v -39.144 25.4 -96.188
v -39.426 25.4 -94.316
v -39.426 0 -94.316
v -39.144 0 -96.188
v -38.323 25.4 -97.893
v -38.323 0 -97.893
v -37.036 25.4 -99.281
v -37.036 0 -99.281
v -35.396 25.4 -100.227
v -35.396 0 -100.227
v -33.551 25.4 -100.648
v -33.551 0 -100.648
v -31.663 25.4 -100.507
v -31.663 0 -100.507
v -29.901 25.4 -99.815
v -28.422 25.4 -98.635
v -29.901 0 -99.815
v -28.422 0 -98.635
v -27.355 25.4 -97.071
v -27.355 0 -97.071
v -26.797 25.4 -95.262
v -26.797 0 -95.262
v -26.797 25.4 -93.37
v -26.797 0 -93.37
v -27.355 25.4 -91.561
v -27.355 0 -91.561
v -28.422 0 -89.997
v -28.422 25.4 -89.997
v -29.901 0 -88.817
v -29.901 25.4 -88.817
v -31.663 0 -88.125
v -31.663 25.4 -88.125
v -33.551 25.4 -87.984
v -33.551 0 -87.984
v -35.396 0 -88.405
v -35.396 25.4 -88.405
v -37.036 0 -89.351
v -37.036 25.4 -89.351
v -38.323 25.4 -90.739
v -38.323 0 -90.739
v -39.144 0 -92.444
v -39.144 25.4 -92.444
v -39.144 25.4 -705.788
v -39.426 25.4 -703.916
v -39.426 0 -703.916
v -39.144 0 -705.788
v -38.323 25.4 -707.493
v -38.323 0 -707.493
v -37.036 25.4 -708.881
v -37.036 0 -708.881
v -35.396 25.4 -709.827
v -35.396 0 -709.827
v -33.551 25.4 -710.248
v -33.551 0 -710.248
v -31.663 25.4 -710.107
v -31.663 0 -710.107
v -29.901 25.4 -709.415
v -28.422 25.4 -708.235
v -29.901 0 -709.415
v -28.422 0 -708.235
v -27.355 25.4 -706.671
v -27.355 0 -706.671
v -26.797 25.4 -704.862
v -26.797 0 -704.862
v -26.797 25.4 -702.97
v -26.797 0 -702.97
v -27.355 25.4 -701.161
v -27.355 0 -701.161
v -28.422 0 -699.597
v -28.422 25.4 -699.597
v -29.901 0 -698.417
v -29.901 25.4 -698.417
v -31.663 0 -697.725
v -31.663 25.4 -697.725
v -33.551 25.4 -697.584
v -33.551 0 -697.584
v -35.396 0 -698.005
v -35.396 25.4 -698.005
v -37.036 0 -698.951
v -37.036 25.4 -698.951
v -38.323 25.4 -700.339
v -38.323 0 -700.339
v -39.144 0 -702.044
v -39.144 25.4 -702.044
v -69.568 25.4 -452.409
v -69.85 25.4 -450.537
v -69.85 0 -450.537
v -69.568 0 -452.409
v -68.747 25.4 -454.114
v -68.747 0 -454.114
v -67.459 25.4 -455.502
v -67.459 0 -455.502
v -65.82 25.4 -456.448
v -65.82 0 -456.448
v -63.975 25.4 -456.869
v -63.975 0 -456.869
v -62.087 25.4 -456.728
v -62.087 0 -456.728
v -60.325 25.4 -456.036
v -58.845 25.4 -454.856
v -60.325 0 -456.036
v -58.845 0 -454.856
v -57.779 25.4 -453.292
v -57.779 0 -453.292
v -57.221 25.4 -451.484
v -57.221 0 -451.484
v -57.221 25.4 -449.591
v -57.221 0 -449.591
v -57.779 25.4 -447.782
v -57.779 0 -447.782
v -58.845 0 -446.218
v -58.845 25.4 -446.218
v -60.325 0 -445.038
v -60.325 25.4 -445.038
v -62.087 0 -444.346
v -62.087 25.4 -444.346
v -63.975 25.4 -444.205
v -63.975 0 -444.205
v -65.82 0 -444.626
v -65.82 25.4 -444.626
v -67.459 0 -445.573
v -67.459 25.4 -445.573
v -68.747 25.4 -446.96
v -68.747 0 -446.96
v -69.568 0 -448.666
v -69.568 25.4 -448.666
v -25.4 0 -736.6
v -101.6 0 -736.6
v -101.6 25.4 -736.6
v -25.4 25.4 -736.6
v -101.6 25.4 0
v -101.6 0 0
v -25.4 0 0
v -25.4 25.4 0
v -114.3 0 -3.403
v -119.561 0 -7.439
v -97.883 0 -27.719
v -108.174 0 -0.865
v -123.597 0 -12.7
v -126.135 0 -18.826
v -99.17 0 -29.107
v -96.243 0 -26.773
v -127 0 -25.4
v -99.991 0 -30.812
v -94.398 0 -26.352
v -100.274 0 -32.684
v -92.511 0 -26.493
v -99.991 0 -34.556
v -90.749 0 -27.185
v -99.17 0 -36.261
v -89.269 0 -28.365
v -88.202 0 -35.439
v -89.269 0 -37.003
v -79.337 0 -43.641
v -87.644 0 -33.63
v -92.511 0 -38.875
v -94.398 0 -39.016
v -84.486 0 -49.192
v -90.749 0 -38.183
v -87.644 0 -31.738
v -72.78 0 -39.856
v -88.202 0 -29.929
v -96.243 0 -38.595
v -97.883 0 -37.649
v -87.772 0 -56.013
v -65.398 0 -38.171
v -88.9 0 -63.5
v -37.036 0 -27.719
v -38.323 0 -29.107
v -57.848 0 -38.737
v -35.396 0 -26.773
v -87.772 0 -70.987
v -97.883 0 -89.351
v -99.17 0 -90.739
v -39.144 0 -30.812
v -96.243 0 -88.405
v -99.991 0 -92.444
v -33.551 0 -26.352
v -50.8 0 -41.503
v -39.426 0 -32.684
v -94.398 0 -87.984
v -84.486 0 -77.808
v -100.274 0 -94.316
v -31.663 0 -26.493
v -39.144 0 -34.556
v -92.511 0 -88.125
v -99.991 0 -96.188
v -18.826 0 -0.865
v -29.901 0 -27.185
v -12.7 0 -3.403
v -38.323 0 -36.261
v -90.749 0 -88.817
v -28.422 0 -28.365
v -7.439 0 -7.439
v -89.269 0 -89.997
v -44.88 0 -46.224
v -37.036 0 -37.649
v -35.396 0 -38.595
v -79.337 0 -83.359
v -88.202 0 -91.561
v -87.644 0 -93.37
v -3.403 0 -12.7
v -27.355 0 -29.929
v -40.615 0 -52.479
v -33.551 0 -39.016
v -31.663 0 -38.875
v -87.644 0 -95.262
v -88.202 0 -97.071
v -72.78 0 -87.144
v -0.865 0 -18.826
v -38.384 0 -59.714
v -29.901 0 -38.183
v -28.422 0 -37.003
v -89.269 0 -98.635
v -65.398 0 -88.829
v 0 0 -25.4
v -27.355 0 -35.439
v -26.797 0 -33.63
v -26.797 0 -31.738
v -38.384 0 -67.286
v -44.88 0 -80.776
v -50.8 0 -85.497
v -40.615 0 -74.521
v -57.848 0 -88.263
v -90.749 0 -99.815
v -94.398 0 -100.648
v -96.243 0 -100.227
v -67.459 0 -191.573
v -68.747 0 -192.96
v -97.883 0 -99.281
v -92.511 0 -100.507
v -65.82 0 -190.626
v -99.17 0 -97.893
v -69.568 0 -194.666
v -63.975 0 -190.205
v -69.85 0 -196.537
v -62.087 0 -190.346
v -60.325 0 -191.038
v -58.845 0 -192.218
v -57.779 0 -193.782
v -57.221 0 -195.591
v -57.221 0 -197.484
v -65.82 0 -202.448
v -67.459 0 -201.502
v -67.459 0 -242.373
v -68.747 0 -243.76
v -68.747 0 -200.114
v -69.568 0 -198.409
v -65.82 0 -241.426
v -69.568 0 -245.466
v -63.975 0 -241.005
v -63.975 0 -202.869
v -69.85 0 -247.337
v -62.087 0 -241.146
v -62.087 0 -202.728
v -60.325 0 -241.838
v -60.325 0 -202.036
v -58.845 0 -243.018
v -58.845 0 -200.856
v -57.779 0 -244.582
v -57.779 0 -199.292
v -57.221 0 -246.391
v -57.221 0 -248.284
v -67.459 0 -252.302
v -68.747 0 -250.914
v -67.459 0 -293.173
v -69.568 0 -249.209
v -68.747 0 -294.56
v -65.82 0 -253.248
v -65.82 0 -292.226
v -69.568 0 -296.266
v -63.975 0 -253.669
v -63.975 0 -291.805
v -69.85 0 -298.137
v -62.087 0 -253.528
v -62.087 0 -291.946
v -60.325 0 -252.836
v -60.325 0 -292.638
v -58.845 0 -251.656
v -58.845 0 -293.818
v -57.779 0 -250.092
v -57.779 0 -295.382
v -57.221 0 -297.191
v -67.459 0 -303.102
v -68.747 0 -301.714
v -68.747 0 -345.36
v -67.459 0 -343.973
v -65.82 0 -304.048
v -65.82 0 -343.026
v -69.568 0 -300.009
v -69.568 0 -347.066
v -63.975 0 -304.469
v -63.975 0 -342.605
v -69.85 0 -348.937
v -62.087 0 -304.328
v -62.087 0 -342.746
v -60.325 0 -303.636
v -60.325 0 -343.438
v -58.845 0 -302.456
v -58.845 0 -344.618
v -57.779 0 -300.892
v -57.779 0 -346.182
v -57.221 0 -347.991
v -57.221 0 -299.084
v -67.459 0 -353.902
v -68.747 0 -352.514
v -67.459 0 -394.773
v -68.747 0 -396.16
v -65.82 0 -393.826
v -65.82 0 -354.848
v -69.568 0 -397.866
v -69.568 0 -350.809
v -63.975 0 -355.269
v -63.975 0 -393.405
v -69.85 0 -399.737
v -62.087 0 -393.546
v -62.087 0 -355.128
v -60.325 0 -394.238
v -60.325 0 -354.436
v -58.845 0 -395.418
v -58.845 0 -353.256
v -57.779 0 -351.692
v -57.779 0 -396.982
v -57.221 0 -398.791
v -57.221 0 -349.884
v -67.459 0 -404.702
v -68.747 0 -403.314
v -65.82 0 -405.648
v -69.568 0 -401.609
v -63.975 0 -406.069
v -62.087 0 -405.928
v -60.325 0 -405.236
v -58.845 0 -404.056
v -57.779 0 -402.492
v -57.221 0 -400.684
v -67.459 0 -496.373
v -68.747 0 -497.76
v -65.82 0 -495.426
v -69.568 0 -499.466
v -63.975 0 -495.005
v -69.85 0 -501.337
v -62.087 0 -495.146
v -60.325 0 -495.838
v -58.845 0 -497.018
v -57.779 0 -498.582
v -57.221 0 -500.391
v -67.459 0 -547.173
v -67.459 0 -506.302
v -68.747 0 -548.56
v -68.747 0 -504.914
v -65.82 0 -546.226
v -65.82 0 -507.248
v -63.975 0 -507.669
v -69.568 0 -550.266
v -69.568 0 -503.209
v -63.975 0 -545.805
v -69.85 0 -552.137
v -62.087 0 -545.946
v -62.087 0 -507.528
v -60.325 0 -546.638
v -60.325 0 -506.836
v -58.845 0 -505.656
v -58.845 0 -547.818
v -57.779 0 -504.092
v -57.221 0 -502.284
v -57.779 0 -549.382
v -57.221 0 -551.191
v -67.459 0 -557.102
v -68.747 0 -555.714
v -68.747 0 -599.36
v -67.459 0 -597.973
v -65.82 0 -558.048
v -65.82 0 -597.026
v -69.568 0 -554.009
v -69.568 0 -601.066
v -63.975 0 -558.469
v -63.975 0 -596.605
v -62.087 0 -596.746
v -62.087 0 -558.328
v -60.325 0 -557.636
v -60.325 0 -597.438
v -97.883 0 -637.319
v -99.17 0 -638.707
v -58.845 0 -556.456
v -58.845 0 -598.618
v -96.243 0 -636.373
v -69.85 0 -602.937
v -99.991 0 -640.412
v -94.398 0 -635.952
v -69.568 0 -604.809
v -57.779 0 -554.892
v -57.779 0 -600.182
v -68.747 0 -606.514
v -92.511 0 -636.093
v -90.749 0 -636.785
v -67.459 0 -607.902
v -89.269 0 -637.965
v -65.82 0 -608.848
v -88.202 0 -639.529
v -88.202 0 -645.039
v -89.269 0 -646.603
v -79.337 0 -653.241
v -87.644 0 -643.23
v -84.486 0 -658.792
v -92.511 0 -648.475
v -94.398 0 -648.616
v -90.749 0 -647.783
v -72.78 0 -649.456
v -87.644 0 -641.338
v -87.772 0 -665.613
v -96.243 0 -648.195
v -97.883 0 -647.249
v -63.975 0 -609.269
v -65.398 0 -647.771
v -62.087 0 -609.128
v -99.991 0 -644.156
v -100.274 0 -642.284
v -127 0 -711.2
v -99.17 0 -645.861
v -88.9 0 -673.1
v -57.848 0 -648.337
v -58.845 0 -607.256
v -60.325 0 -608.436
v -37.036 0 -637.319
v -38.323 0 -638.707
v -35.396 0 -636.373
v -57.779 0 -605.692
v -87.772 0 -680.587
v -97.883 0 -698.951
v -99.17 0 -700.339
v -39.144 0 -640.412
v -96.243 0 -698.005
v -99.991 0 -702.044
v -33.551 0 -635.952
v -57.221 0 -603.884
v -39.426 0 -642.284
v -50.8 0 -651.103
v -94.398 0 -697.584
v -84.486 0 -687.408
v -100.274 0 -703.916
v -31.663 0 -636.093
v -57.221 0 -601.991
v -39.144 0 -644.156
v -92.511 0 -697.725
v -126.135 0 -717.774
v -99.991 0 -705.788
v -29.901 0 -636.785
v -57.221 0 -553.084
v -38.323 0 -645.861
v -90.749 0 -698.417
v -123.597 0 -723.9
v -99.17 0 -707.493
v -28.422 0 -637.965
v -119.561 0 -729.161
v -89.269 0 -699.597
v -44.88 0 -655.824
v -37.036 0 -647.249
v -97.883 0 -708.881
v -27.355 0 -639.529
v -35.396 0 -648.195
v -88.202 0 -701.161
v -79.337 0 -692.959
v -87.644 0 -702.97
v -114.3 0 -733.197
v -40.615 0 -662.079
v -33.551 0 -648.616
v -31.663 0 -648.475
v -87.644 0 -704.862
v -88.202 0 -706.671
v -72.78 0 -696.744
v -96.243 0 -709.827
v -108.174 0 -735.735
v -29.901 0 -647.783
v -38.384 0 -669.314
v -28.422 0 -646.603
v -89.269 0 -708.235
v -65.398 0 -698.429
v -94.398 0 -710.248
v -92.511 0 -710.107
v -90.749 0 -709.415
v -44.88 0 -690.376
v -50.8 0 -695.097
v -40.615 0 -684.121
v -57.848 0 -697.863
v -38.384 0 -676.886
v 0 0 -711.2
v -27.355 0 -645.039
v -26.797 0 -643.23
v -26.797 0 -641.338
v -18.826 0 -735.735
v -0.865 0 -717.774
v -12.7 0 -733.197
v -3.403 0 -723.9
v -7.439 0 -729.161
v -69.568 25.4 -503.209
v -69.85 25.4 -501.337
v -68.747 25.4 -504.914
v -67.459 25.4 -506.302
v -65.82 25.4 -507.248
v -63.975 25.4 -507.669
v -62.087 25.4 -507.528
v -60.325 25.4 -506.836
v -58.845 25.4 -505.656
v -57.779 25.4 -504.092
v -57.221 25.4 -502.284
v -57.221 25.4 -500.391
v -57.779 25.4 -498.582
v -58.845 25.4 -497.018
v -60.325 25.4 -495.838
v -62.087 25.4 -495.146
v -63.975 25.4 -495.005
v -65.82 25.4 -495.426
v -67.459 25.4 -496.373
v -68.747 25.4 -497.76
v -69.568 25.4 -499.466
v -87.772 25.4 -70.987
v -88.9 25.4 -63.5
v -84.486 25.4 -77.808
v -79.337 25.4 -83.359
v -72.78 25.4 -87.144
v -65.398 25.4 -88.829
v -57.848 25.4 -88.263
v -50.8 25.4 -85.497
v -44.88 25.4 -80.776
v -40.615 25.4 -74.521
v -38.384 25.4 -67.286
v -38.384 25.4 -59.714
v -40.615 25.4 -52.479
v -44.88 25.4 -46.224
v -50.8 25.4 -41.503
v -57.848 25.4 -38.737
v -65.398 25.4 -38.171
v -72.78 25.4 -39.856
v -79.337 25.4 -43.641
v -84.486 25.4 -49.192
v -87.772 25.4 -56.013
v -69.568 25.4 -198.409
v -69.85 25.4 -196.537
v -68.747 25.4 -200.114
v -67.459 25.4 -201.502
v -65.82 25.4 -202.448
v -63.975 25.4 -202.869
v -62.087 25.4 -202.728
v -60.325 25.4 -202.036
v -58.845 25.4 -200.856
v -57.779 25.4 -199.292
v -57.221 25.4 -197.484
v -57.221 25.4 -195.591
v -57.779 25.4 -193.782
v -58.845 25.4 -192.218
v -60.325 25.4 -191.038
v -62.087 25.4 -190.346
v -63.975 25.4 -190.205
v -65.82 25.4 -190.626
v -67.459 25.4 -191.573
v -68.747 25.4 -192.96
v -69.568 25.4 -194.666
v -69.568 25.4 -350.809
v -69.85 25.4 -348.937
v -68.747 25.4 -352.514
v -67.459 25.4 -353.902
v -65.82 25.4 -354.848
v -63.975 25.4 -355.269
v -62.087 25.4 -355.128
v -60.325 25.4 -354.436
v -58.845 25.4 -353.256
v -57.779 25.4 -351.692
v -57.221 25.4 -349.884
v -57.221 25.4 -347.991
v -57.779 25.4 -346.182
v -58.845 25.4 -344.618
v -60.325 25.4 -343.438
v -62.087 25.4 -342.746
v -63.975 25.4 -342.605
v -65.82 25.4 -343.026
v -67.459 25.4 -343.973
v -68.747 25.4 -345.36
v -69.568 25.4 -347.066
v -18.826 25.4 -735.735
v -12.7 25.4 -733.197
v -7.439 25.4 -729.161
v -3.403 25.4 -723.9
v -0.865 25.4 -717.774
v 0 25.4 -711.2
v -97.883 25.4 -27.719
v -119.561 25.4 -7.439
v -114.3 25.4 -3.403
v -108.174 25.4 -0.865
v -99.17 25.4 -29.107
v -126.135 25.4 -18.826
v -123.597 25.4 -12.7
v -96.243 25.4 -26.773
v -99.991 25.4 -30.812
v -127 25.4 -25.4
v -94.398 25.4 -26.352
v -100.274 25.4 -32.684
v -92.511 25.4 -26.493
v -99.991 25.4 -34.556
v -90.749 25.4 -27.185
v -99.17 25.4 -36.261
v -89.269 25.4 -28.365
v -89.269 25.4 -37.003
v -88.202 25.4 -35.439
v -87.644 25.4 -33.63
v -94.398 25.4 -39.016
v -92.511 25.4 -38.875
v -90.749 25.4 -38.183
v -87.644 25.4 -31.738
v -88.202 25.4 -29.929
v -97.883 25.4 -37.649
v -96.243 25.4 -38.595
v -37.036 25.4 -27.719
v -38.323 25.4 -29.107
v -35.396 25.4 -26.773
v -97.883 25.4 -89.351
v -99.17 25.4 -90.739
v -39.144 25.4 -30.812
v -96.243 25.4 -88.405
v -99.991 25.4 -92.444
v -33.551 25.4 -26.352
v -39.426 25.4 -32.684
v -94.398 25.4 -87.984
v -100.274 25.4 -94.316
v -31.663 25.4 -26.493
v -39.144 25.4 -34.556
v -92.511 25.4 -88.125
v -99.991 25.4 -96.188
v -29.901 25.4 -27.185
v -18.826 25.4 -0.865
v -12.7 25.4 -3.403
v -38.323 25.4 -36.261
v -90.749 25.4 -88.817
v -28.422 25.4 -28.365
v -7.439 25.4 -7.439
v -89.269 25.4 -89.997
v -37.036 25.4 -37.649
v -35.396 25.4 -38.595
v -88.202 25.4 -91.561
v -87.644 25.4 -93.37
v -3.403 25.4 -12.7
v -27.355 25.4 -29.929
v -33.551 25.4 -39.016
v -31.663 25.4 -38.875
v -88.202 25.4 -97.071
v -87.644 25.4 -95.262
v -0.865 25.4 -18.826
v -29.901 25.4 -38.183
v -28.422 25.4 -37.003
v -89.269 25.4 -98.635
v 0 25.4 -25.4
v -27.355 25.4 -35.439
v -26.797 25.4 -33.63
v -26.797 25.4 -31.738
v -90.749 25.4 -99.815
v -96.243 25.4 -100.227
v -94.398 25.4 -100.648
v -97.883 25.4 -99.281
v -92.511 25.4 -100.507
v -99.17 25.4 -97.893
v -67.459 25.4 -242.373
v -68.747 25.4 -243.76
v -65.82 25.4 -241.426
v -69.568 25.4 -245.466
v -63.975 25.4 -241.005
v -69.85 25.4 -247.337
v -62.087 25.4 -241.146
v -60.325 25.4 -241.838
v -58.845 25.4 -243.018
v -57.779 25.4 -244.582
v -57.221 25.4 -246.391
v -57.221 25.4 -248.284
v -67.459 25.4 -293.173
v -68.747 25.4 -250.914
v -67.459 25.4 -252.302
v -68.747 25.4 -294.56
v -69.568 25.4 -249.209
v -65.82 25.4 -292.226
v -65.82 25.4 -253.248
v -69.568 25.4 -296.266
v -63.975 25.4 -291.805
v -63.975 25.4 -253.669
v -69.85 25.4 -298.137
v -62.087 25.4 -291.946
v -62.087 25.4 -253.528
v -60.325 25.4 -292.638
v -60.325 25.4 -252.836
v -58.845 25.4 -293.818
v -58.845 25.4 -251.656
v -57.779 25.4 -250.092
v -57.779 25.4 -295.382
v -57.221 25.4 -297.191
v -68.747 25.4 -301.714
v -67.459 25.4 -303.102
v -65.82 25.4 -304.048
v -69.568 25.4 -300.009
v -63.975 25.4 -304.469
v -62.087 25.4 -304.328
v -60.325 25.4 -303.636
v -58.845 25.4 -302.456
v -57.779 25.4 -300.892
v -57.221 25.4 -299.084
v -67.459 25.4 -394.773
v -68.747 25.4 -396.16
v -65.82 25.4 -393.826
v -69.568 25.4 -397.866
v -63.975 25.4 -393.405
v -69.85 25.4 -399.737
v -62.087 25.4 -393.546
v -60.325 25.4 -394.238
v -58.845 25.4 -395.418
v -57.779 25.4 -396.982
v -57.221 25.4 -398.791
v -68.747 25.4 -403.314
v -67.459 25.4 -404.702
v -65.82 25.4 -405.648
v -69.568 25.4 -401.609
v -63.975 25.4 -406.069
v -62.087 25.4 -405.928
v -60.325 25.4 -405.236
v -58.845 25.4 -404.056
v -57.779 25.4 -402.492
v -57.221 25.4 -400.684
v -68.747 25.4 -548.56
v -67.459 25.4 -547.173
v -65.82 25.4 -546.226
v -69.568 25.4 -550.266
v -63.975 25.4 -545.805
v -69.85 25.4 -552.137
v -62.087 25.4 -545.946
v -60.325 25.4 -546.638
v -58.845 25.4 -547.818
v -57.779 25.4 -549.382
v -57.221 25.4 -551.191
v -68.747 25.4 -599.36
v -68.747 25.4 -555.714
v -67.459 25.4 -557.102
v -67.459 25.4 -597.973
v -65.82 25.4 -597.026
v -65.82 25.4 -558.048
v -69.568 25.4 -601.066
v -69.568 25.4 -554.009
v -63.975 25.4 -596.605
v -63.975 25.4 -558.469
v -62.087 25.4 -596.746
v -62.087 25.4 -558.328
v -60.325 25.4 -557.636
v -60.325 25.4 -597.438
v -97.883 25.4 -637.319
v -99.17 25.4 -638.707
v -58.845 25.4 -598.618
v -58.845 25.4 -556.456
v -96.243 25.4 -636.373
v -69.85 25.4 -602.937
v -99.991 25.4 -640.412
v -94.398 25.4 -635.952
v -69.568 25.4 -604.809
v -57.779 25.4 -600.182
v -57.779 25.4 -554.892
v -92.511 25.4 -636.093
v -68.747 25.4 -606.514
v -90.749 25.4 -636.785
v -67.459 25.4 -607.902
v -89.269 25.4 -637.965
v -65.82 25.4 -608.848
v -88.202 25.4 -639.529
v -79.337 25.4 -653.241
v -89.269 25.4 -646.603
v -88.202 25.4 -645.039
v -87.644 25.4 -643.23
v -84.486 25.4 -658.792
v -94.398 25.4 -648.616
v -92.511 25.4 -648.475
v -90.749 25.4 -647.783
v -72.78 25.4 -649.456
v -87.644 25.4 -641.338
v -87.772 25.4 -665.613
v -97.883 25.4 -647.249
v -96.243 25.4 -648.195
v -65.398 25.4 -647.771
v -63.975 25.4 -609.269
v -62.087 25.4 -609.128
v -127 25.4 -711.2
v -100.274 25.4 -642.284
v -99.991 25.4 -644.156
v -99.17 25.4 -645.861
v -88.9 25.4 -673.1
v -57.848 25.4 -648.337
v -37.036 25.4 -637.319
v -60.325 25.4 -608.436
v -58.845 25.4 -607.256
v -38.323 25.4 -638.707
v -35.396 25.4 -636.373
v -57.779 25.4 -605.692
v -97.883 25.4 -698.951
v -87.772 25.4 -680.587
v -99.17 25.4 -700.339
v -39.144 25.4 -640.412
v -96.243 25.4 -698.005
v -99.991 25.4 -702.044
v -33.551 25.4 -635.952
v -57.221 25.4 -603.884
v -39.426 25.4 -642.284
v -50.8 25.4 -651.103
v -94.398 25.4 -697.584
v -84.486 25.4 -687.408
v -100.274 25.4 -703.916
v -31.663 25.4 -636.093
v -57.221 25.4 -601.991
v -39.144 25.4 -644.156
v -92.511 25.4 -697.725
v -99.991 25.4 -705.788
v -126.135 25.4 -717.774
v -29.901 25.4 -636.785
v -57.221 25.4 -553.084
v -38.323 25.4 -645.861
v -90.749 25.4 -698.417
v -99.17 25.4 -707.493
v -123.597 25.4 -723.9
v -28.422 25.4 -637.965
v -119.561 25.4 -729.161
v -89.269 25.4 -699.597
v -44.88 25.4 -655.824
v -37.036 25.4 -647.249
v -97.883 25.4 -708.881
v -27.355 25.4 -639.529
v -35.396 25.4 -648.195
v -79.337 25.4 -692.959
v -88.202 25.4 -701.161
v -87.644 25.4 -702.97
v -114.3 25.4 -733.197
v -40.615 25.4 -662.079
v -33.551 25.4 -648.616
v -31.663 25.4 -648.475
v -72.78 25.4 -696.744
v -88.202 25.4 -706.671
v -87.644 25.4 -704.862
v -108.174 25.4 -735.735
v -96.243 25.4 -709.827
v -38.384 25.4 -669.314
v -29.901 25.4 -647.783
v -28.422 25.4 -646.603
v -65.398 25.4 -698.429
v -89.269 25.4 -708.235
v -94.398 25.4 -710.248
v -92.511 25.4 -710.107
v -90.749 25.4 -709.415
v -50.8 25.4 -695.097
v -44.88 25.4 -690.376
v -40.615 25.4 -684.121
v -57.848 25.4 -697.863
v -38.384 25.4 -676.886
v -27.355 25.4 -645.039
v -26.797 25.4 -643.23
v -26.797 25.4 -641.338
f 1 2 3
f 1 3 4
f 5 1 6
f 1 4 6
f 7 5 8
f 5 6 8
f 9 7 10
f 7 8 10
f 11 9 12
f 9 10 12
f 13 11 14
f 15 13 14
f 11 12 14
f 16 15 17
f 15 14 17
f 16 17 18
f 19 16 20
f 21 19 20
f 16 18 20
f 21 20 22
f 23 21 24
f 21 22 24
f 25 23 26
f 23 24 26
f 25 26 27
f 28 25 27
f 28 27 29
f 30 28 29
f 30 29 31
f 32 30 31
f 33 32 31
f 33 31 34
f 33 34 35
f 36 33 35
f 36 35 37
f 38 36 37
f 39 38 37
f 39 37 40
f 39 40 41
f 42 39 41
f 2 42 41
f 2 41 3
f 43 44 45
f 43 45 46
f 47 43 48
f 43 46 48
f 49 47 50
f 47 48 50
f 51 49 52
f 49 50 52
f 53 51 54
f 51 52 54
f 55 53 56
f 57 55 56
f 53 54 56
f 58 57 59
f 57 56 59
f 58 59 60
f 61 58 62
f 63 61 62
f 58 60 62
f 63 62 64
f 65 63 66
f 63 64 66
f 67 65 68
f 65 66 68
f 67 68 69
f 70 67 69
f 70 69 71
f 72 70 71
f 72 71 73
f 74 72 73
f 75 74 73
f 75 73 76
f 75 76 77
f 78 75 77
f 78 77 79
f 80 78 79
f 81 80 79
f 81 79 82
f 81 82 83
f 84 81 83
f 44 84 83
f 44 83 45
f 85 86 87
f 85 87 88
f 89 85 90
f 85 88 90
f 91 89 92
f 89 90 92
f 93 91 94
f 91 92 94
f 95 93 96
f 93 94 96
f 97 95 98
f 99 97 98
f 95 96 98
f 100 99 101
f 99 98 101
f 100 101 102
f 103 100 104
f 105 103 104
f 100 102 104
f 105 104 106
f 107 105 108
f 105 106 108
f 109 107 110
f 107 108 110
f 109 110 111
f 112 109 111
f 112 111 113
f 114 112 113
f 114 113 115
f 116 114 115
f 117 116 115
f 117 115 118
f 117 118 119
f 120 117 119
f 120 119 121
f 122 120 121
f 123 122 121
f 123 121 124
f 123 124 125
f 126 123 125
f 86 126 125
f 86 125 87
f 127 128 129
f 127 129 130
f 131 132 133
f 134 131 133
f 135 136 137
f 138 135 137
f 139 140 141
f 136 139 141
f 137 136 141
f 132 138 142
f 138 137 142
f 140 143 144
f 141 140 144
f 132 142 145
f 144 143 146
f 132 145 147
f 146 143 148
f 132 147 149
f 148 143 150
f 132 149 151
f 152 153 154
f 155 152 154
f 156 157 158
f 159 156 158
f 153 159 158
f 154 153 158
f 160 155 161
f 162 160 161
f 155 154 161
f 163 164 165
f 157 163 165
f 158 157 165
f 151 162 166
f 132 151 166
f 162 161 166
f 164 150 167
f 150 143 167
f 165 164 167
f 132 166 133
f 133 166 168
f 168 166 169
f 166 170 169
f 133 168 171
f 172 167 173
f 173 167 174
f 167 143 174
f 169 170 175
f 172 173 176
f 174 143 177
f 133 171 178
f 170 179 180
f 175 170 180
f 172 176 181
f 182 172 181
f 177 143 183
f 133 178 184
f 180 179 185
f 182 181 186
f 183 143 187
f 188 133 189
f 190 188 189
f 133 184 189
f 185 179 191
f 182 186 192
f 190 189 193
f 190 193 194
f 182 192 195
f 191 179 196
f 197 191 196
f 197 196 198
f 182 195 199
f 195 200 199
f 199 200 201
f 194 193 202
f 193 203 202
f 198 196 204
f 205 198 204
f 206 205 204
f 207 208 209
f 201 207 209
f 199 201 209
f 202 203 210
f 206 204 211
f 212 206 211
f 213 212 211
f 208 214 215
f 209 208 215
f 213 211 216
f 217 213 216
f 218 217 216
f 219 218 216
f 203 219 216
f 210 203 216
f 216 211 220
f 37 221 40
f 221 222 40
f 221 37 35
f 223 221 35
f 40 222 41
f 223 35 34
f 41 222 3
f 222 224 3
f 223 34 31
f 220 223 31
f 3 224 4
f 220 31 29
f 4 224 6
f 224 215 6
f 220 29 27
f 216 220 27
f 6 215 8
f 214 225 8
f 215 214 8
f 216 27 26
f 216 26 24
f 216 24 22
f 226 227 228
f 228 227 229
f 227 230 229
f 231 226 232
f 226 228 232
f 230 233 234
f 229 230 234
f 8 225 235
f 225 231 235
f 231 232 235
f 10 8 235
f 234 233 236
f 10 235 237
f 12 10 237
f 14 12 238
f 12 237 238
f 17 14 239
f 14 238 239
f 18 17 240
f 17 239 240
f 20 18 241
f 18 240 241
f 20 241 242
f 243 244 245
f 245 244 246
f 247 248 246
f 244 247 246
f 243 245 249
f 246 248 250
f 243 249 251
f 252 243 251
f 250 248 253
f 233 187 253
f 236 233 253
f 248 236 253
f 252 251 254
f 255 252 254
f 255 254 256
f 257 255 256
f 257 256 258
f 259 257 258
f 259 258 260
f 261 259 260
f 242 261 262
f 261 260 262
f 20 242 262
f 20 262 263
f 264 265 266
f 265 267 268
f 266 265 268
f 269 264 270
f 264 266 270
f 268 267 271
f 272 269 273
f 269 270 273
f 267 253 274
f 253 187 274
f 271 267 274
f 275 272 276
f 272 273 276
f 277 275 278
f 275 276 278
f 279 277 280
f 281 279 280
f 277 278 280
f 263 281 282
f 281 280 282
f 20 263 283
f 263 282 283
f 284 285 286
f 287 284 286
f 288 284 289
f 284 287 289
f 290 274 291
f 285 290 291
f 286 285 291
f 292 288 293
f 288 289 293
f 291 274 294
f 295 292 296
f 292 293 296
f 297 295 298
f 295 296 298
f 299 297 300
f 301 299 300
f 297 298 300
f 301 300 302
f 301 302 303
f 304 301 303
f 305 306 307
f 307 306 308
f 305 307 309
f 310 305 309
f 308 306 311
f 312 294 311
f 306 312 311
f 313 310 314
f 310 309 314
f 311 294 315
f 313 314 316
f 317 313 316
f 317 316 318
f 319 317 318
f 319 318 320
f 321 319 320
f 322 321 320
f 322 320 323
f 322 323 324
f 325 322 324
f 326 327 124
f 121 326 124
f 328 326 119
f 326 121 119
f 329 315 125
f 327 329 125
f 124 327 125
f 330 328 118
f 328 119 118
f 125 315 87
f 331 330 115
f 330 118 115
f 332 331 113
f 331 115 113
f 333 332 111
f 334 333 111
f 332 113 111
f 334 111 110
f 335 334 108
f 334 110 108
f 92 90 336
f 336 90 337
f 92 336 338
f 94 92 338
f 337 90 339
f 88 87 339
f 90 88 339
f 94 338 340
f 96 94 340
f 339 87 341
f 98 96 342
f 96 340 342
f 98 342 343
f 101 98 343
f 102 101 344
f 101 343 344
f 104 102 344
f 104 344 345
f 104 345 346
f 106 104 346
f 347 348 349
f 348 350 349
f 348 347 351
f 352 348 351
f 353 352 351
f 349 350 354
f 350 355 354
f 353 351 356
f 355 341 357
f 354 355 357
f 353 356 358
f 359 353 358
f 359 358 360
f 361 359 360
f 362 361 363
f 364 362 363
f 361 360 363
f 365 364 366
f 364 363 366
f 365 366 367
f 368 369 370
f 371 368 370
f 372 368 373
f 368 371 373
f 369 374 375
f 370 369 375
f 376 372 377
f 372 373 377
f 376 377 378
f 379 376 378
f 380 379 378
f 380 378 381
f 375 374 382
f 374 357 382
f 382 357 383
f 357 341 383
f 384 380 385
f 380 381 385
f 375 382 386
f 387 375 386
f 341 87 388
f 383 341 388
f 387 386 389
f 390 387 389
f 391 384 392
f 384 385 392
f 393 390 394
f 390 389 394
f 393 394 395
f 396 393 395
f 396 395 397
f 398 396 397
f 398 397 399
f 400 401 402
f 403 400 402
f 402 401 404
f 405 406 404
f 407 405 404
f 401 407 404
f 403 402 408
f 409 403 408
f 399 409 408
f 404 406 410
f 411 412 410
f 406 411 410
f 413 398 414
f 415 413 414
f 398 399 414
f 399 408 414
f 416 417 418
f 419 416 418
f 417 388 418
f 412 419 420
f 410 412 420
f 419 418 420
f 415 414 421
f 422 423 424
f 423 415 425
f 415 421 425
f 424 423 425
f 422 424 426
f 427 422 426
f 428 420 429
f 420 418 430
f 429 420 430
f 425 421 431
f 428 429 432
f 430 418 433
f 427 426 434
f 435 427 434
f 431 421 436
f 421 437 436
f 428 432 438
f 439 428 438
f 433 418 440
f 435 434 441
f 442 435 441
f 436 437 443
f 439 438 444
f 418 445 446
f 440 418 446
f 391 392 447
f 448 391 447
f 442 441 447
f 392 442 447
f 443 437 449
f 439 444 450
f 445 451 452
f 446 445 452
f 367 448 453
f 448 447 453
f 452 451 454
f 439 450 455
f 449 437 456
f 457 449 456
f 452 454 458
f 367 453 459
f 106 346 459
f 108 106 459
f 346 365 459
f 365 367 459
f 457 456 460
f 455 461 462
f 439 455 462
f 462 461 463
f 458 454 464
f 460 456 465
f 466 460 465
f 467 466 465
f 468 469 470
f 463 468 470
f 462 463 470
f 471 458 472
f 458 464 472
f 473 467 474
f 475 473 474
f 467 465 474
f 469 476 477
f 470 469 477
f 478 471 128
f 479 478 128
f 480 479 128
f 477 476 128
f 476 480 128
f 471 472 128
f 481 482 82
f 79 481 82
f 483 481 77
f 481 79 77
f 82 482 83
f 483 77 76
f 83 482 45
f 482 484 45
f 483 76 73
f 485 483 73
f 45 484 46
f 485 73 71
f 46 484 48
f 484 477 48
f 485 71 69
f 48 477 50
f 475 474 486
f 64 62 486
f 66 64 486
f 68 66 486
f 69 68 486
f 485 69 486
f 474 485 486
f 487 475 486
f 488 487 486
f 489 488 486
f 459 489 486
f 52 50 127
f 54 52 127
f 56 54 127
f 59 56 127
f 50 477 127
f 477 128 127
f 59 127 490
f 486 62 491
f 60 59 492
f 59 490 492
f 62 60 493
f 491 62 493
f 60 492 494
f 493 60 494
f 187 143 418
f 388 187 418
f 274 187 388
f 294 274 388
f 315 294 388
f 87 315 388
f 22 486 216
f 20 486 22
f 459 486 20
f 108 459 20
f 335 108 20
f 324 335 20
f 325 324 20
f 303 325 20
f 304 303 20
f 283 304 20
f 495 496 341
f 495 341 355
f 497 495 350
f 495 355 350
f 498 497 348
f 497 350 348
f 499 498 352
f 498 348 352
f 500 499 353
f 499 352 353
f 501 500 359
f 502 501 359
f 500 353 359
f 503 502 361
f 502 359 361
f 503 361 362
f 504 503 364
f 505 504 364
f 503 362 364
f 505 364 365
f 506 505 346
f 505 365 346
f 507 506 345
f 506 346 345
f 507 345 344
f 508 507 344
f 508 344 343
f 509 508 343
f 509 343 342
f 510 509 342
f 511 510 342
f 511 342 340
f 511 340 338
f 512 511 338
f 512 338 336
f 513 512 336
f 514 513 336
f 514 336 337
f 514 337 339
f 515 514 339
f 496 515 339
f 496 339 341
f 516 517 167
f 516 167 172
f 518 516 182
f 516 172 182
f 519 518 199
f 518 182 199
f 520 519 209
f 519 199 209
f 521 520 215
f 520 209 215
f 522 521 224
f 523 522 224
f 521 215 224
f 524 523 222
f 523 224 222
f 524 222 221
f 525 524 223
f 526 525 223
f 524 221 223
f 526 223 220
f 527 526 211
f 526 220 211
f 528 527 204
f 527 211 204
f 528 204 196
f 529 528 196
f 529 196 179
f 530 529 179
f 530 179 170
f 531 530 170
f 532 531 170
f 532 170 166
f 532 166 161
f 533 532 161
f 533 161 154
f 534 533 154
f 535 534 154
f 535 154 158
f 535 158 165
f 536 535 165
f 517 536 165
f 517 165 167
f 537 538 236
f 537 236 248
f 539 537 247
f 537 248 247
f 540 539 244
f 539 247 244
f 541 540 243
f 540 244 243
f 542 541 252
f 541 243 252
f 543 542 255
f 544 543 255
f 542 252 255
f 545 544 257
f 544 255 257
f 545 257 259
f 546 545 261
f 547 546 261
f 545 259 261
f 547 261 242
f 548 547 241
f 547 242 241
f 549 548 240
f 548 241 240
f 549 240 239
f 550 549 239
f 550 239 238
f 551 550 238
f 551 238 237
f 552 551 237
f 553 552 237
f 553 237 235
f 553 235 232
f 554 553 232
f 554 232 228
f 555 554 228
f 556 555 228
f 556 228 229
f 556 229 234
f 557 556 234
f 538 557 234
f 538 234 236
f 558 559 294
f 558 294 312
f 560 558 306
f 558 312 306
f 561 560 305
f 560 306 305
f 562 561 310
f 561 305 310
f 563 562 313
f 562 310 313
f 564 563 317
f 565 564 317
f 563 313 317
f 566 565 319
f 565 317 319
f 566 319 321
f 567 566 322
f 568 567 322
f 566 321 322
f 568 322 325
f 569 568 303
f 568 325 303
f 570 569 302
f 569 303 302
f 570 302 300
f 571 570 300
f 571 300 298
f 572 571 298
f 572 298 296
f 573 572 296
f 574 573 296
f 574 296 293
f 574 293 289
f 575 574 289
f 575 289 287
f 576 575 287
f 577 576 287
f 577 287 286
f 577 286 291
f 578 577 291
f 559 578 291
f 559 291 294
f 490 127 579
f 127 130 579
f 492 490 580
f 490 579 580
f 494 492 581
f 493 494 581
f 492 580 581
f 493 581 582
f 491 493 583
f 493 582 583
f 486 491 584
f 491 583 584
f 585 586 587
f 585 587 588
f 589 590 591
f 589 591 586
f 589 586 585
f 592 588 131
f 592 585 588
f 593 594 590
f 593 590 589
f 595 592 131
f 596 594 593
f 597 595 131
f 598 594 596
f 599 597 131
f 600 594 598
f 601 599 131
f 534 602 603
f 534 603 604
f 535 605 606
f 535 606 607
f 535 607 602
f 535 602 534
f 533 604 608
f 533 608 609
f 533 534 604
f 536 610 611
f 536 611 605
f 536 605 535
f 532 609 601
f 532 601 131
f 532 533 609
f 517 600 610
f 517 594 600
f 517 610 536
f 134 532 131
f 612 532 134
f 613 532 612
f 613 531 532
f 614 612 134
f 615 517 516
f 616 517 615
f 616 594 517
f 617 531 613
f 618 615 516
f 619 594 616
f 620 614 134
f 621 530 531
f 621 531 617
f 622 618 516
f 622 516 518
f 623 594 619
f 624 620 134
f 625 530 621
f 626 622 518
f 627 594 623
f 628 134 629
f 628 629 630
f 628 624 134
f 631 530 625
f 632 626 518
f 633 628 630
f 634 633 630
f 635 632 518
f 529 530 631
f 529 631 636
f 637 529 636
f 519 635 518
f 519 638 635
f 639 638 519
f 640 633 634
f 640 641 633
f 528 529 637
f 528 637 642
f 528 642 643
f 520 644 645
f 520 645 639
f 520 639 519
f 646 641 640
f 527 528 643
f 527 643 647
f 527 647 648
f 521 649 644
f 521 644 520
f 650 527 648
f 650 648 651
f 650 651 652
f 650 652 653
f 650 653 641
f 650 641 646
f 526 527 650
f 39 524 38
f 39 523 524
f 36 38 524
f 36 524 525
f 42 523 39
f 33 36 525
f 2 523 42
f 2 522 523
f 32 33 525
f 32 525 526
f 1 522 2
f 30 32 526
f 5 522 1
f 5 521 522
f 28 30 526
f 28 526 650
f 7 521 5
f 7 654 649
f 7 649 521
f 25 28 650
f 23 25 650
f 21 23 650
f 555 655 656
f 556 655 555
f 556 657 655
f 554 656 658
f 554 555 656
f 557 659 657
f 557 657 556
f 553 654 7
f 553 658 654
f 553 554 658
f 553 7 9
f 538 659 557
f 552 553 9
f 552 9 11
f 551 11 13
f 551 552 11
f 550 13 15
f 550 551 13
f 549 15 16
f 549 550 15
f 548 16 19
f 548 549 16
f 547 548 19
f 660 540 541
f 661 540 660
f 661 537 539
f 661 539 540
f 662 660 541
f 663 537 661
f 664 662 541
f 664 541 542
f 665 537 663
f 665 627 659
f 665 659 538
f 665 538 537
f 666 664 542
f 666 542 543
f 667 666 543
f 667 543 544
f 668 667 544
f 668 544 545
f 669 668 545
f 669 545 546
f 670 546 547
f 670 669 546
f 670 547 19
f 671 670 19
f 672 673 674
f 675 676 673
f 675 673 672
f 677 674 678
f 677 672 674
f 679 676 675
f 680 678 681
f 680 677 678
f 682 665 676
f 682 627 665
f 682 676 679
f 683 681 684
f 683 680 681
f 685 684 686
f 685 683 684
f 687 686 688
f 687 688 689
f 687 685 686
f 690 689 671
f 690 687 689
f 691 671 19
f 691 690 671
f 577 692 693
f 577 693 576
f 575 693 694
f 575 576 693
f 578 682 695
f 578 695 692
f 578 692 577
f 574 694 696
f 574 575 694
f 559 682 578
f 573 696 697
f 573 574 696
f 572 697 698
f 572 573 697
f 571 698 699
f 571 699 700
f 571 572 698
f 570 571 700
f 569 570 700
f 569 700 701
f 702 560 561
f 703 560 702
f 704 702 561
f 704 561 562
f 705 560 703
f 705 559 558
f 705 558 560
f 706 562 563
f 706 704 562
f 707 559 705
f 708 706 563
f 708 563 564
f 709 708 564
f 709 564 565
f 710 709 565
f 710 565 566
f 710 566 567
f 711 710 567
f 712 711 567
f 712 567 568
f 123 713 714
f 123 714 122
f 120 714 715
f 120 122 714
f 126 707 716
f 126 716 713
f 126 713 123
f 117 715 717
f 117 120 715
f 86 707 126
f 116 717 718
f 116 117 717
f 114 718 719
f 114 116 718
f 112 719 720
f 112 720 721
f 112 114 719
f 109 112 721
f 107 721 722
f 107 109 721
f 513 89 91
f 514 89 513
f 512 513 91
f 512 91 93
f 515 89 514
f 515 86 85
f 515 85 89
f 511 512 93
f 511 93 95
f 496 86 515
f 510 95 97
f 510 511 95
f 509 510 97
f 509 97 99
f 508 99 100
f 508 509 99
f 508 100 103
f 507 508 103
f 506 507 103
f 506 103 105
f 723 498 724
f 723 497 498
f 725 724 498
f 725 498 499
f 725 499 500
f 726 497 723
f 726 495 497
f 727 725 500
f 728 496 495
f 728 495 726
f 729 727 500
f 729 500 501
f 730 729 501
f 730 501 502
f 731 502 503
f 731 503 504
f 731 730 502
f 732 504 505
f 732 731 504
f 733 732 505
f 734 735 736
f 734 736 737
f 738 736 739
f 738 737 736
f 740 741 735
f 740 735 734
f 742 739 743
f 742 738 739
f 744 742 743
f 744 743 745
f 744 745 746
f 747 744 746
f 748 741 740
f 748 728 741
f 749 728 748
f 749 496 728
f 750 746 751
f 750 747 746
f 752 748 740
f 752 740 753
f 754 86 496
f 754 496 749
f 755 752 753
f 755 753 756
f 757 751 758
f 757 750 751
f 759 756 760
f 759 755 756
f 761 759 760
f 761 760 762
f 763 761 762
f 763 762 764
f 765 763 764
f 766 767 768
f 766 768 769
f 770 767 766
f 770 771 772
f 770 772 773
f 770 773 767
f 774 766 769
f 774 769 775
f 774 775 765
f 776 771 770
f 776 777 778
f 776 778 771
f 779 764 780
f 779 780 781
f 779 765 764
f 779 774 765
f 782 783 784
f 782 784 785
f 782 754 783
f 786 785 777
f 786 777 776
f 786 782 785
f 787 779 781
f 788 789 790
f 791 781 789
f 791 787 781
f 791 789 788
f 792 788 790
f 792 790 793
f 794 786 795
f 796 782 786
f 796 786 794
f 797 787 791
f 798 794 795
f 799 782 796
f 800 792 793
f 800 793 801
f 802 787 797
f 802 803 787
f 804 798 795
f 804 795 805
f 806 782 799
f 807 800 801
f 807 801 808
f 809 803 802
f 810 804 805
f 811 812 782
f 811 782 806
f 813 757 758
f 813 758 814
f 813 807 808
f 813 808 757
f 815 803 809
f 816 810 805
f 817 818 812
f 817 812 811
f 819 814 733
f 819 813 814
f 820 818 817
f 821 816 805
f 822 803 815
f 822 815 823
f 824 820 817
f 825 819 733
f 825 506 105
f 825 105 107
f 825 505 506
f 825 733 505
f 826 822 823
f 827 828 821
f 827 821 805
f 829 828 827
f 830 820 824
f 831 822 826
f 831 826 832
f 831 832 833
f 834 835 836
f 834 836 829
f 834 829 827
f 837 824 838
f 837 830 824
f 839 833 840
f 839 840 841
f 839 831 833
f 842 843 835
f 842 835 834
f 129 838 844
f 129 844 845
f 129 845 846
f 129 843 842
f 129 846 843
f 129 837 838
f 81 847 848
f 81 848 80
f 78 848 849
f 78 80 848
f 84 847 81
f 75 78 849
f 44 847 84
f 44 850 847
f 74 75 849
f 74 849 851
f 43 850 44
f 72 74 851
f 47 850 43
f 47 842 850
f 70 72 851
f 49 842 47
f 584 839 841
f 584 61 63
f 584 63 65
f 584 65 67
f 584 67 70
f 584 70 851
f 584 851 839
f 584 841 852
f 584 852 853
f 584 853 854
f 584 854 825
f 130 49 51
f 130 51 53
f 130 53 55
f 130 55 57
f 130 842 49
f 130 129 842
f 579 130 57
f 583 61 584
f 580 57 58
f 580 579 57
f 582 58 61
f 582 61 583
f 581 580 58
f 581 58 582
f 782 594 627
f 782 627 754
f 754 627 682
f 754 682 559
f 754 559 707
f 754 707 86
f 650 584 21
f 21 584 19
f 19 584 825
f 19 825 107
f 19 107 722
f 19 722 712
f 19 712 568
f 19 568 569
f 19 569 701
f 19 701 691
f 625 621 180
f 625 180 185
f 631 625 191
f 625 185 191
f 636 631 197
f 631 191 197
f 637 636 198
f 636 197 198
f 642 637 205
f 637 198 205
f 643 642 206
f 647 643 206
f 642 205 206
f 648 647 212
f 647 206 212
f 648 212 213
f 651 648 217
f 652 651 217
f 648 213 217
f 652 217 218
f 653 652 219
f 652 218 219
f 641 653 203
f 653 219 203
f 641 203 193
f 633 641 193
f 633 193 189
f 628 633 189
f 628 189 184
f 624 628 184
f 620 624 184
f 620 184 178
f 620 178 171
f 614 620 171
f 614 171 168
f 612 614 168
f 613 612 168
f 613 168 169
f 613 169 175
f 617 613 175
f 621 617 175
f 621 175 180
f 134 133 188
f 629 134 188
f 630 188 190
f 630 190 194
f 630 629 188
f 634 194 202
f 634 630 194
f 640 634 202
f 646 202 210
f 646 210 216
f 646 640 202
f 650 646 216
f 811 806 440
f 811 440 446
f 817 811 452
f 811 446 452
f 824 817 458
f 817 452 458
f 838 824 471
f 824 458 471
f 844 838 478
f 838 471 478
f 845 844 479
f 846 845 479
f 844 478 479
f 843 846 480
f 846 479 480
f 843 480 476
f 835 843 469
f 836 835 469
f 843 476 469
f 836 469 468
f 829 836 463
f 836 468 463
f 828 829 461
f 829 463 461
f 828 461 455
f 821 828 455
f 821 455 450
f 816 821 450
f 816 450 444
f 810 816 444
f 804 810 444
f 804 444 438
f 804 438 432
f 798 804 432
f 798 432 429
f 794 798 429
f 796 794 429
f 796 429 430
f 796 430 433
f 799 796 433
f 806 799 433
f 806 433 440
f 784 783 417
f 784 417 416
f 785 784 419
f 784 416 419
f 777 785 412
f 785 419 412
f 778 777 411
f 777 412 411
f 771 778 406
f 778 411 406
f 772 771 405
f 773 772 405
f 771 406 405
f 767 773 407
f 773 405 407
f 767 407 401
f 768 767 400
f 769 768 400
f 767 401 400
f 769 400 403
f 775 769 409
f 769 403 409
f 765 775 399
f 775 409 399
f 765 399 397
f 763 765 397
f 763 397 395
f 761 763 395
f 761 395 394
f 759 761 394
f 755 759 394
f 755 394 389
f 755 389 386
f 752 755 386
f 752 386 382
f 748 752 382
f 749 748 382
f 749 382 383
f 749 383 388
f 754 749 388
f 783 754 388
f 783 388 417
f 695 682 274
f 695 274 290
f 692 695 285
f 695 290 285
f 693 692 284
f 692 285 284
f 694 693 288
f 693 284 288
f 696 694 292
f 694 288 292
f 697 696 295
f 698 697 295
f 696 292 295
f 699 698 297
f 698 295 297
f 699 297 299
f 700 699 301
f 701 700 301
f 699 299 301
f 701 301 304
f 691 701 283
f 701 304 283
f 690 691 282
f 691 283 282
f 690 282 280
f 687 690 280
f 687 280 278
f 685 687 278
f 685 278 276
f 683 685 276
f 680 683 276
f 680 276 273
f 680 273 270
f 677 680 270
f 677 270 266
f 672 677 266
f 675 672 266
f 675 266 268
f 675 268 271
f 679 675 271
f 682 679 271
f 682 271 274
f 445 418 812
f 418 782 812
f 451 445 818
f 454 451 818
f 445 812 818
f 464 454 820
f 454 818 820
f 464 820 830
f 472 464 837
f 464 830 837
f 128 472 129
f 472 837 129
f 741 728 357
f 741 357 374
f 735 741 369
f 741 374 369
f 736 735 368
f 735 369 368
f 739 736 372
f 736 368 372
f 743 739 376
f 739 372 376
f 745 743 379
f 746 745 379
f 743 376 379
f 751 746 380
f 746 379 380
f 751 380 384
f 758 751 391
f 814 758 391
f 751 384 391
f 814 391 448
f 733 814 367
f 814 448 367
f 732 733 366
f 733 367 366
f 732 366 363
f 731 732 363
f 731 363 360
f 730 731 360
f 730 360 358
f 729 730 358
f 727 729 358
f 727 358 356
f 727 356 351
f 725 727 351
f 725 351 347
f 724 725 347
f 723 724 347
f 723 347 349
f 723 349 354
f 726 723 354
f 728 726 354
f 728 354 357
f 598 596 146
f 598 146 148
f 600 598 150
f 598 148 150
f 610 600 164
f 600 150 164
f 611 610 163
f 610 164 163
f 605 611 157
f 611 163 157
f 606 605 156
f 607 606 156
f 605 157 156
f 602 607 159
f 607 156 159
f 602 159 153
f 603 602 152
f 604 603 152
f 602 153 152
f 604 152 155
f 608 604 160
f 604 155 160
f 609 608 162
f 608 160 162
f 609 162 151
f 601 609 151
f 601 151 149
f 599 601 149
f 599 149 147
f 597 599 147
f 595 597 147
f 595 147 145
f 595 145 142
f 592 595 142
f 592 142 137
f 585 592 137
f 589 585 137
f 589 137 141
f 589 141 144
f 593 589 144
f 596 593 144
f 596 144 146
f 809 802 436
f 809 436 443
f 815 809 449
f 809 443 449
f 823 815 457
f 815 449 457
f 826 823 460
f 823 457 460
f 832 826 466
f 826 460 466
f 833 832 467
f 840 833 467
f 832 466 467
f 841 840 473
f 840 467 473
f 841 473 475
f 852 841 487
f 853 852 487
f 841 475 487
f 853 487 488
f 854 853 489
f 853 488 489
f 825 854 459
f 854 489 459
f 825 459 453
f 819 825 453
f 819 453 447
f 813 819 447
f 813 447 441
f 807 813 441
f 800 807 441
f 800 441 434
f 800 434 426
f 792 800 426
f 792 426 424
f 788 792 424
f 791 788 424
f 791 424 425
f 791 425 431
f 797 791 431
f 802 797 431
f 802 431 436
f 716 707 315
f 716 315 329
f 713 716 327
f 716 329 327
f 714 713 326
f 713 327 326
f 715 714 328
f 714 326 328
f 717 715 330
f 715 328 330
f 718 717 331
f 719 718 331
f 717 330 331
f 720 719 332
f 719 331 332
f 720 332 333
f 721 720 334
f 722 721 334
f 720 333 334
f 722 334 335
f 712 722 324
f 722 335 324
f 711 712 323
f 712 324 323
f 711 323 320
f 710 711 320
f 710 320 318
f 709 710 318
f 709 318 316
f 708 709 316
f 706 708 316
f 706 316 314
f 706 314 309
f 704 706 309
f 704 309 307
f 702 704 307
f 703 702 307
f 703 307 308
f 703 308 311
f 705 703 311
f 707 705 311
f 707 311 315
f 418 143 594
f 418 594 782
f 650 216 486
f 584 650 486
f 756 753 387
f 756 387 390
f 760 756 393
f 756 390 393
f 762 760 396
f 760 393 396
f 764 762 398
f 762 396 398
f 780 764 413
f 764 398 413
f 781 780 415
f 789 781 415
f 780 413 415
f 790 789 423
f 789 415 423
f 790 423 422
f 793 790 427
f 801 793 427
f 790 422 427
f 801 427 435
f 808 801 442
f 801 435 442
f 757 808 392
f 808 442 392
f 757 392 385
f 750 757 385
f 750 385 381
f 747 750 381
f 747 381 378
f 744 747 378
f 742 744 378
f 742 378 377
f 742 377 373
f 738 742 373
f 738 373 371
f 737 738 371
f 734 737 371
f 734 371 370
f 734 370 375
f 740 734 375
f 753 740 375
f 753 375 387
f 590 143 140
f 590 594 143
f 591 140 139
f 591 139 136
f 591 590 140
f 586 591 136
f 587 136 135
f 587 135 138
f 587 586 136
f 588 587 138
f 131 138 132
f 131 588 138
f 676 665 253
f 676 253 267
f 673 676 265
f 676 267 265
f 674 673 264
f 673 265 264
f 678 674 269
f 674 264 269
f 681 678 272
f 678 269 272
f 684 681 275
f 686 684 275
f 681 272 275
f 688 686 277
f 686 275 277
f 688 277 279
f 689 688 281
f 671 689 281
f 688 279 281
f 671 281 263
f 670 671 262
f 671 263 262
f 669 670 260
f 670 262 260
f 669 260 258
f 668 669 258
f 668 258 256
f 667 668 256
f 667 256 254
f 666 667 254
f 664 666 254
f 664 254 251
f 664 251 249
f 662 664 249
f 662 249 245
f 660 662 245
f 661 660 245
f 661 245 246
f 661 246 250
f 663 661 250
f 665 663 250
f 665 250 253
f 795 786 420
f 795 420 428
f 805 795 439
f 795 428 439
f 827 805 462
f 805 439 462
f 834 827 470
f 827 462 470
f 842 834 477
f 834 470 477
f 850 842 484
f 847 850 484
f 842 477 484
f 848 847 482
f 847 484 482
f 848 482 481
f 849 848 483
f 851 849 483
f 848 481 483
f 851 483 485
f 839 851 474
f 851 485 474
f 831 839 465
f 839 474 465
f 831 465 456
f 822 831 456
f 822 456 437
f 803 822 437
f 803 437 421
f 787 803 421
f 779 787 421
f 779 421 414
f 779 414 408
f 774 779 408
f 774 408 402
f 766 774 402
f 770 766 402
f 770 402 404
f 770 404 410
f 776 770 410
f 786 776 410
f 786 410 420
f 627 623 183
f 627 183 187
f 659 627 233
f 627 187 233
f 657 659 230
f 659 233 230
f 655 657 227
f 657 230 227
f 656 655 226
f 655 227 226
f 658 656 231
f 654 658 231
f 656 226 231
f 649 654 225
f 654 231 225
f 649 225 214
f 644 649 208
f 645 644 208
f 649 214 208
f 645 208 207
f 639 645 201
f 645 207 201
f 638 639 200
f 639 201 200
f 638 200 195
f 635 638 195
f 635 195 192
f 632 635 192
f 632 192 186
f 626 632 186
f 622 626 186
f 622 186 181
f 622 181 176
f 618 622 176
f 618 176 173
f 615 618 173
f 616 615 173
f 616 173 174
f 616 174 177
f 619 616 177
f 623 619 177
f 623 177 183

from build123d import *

# Parameters (mm, degrees)
SKETCH2_W                  = 127
SKETCH2_H                  = 736.6
BOSS_EXTRUDE1_DEPTH        = 25.4
F_1_2_0_5_DIAMETER_HOLE1_D = 50.8
F_1_2_0_5_DIAMETER_HOLE2_D = 12.7
FILLET1_R                  = 25.4


with BuildPart() as part:
    # Sketch2 → Boss-Extrude1 (new body)
    with BuildSketch(Plane(origin=(0, 0, 0), x_dir=(1, 0, 0), z_dir=(0, 1, 0))):
        with Locations((-63.5, 368.3)):
            Rectangle(SKETCH2_W, SKETCH2_H)
    extrude(amount=BOSS_EXTRUDE1_DEPTH)

    # 1/2 (0.5) Diameter Hole1 (through all)
    with Locations(Plane(origin=(0, 25.4, 0), x_dir=(1, 0, 0), z_dir=(0, 1, 0))):
        with Locations((-63.5, 673.1), (-63.5, 63.5)):
            Hole(F_1_2_0_5_DIAMETER_HOLE1_D / 2)

    # 1/2 (0.5) Diameter Hole2 (through all)
    with Locations(Plane(origin=(0, 25.4, 0), x_dir=(1, 0, 0), z_dir=(0, 1, 0))):
        with Locations((-93.923508124, 703.915980712), (-33.076491876, 703.915980712), (-33.076491876, 642.284019288), (-93.923508124, 642.284019288), (-63.5, 602.937236364), (-63.5, 552.137236364), (-63.5, 501.337236364), (-63.5, 450.537236364), (-63.5, 399.737236364), (-63.5, 348.937236364), (-63.5, 298.137236364), (-63.5, 247.337236364), (-63.5, 196.537236364), (-93.923508124, 32.684019288), (-93.923508124, 94.315980712), (-33.076491876, 94.315980712), (-33.076491876, 32.684019288)):
            Hole(F_1_2_0_5_DIAMETER_HOLE2_D / 2)

    # Fillet1
    fillet1_edges = [part.edges().sort_by_distance(p)[0] for p in [
        (0, 12.7, 0),
        (-127, 12.7, 0),
        (-127, 12.7, -736.6),
        (0, 12.7, -736.6),
    ]]
    fillet(fillet1_edges, radius=FILLET1_R)


solid = part.part
